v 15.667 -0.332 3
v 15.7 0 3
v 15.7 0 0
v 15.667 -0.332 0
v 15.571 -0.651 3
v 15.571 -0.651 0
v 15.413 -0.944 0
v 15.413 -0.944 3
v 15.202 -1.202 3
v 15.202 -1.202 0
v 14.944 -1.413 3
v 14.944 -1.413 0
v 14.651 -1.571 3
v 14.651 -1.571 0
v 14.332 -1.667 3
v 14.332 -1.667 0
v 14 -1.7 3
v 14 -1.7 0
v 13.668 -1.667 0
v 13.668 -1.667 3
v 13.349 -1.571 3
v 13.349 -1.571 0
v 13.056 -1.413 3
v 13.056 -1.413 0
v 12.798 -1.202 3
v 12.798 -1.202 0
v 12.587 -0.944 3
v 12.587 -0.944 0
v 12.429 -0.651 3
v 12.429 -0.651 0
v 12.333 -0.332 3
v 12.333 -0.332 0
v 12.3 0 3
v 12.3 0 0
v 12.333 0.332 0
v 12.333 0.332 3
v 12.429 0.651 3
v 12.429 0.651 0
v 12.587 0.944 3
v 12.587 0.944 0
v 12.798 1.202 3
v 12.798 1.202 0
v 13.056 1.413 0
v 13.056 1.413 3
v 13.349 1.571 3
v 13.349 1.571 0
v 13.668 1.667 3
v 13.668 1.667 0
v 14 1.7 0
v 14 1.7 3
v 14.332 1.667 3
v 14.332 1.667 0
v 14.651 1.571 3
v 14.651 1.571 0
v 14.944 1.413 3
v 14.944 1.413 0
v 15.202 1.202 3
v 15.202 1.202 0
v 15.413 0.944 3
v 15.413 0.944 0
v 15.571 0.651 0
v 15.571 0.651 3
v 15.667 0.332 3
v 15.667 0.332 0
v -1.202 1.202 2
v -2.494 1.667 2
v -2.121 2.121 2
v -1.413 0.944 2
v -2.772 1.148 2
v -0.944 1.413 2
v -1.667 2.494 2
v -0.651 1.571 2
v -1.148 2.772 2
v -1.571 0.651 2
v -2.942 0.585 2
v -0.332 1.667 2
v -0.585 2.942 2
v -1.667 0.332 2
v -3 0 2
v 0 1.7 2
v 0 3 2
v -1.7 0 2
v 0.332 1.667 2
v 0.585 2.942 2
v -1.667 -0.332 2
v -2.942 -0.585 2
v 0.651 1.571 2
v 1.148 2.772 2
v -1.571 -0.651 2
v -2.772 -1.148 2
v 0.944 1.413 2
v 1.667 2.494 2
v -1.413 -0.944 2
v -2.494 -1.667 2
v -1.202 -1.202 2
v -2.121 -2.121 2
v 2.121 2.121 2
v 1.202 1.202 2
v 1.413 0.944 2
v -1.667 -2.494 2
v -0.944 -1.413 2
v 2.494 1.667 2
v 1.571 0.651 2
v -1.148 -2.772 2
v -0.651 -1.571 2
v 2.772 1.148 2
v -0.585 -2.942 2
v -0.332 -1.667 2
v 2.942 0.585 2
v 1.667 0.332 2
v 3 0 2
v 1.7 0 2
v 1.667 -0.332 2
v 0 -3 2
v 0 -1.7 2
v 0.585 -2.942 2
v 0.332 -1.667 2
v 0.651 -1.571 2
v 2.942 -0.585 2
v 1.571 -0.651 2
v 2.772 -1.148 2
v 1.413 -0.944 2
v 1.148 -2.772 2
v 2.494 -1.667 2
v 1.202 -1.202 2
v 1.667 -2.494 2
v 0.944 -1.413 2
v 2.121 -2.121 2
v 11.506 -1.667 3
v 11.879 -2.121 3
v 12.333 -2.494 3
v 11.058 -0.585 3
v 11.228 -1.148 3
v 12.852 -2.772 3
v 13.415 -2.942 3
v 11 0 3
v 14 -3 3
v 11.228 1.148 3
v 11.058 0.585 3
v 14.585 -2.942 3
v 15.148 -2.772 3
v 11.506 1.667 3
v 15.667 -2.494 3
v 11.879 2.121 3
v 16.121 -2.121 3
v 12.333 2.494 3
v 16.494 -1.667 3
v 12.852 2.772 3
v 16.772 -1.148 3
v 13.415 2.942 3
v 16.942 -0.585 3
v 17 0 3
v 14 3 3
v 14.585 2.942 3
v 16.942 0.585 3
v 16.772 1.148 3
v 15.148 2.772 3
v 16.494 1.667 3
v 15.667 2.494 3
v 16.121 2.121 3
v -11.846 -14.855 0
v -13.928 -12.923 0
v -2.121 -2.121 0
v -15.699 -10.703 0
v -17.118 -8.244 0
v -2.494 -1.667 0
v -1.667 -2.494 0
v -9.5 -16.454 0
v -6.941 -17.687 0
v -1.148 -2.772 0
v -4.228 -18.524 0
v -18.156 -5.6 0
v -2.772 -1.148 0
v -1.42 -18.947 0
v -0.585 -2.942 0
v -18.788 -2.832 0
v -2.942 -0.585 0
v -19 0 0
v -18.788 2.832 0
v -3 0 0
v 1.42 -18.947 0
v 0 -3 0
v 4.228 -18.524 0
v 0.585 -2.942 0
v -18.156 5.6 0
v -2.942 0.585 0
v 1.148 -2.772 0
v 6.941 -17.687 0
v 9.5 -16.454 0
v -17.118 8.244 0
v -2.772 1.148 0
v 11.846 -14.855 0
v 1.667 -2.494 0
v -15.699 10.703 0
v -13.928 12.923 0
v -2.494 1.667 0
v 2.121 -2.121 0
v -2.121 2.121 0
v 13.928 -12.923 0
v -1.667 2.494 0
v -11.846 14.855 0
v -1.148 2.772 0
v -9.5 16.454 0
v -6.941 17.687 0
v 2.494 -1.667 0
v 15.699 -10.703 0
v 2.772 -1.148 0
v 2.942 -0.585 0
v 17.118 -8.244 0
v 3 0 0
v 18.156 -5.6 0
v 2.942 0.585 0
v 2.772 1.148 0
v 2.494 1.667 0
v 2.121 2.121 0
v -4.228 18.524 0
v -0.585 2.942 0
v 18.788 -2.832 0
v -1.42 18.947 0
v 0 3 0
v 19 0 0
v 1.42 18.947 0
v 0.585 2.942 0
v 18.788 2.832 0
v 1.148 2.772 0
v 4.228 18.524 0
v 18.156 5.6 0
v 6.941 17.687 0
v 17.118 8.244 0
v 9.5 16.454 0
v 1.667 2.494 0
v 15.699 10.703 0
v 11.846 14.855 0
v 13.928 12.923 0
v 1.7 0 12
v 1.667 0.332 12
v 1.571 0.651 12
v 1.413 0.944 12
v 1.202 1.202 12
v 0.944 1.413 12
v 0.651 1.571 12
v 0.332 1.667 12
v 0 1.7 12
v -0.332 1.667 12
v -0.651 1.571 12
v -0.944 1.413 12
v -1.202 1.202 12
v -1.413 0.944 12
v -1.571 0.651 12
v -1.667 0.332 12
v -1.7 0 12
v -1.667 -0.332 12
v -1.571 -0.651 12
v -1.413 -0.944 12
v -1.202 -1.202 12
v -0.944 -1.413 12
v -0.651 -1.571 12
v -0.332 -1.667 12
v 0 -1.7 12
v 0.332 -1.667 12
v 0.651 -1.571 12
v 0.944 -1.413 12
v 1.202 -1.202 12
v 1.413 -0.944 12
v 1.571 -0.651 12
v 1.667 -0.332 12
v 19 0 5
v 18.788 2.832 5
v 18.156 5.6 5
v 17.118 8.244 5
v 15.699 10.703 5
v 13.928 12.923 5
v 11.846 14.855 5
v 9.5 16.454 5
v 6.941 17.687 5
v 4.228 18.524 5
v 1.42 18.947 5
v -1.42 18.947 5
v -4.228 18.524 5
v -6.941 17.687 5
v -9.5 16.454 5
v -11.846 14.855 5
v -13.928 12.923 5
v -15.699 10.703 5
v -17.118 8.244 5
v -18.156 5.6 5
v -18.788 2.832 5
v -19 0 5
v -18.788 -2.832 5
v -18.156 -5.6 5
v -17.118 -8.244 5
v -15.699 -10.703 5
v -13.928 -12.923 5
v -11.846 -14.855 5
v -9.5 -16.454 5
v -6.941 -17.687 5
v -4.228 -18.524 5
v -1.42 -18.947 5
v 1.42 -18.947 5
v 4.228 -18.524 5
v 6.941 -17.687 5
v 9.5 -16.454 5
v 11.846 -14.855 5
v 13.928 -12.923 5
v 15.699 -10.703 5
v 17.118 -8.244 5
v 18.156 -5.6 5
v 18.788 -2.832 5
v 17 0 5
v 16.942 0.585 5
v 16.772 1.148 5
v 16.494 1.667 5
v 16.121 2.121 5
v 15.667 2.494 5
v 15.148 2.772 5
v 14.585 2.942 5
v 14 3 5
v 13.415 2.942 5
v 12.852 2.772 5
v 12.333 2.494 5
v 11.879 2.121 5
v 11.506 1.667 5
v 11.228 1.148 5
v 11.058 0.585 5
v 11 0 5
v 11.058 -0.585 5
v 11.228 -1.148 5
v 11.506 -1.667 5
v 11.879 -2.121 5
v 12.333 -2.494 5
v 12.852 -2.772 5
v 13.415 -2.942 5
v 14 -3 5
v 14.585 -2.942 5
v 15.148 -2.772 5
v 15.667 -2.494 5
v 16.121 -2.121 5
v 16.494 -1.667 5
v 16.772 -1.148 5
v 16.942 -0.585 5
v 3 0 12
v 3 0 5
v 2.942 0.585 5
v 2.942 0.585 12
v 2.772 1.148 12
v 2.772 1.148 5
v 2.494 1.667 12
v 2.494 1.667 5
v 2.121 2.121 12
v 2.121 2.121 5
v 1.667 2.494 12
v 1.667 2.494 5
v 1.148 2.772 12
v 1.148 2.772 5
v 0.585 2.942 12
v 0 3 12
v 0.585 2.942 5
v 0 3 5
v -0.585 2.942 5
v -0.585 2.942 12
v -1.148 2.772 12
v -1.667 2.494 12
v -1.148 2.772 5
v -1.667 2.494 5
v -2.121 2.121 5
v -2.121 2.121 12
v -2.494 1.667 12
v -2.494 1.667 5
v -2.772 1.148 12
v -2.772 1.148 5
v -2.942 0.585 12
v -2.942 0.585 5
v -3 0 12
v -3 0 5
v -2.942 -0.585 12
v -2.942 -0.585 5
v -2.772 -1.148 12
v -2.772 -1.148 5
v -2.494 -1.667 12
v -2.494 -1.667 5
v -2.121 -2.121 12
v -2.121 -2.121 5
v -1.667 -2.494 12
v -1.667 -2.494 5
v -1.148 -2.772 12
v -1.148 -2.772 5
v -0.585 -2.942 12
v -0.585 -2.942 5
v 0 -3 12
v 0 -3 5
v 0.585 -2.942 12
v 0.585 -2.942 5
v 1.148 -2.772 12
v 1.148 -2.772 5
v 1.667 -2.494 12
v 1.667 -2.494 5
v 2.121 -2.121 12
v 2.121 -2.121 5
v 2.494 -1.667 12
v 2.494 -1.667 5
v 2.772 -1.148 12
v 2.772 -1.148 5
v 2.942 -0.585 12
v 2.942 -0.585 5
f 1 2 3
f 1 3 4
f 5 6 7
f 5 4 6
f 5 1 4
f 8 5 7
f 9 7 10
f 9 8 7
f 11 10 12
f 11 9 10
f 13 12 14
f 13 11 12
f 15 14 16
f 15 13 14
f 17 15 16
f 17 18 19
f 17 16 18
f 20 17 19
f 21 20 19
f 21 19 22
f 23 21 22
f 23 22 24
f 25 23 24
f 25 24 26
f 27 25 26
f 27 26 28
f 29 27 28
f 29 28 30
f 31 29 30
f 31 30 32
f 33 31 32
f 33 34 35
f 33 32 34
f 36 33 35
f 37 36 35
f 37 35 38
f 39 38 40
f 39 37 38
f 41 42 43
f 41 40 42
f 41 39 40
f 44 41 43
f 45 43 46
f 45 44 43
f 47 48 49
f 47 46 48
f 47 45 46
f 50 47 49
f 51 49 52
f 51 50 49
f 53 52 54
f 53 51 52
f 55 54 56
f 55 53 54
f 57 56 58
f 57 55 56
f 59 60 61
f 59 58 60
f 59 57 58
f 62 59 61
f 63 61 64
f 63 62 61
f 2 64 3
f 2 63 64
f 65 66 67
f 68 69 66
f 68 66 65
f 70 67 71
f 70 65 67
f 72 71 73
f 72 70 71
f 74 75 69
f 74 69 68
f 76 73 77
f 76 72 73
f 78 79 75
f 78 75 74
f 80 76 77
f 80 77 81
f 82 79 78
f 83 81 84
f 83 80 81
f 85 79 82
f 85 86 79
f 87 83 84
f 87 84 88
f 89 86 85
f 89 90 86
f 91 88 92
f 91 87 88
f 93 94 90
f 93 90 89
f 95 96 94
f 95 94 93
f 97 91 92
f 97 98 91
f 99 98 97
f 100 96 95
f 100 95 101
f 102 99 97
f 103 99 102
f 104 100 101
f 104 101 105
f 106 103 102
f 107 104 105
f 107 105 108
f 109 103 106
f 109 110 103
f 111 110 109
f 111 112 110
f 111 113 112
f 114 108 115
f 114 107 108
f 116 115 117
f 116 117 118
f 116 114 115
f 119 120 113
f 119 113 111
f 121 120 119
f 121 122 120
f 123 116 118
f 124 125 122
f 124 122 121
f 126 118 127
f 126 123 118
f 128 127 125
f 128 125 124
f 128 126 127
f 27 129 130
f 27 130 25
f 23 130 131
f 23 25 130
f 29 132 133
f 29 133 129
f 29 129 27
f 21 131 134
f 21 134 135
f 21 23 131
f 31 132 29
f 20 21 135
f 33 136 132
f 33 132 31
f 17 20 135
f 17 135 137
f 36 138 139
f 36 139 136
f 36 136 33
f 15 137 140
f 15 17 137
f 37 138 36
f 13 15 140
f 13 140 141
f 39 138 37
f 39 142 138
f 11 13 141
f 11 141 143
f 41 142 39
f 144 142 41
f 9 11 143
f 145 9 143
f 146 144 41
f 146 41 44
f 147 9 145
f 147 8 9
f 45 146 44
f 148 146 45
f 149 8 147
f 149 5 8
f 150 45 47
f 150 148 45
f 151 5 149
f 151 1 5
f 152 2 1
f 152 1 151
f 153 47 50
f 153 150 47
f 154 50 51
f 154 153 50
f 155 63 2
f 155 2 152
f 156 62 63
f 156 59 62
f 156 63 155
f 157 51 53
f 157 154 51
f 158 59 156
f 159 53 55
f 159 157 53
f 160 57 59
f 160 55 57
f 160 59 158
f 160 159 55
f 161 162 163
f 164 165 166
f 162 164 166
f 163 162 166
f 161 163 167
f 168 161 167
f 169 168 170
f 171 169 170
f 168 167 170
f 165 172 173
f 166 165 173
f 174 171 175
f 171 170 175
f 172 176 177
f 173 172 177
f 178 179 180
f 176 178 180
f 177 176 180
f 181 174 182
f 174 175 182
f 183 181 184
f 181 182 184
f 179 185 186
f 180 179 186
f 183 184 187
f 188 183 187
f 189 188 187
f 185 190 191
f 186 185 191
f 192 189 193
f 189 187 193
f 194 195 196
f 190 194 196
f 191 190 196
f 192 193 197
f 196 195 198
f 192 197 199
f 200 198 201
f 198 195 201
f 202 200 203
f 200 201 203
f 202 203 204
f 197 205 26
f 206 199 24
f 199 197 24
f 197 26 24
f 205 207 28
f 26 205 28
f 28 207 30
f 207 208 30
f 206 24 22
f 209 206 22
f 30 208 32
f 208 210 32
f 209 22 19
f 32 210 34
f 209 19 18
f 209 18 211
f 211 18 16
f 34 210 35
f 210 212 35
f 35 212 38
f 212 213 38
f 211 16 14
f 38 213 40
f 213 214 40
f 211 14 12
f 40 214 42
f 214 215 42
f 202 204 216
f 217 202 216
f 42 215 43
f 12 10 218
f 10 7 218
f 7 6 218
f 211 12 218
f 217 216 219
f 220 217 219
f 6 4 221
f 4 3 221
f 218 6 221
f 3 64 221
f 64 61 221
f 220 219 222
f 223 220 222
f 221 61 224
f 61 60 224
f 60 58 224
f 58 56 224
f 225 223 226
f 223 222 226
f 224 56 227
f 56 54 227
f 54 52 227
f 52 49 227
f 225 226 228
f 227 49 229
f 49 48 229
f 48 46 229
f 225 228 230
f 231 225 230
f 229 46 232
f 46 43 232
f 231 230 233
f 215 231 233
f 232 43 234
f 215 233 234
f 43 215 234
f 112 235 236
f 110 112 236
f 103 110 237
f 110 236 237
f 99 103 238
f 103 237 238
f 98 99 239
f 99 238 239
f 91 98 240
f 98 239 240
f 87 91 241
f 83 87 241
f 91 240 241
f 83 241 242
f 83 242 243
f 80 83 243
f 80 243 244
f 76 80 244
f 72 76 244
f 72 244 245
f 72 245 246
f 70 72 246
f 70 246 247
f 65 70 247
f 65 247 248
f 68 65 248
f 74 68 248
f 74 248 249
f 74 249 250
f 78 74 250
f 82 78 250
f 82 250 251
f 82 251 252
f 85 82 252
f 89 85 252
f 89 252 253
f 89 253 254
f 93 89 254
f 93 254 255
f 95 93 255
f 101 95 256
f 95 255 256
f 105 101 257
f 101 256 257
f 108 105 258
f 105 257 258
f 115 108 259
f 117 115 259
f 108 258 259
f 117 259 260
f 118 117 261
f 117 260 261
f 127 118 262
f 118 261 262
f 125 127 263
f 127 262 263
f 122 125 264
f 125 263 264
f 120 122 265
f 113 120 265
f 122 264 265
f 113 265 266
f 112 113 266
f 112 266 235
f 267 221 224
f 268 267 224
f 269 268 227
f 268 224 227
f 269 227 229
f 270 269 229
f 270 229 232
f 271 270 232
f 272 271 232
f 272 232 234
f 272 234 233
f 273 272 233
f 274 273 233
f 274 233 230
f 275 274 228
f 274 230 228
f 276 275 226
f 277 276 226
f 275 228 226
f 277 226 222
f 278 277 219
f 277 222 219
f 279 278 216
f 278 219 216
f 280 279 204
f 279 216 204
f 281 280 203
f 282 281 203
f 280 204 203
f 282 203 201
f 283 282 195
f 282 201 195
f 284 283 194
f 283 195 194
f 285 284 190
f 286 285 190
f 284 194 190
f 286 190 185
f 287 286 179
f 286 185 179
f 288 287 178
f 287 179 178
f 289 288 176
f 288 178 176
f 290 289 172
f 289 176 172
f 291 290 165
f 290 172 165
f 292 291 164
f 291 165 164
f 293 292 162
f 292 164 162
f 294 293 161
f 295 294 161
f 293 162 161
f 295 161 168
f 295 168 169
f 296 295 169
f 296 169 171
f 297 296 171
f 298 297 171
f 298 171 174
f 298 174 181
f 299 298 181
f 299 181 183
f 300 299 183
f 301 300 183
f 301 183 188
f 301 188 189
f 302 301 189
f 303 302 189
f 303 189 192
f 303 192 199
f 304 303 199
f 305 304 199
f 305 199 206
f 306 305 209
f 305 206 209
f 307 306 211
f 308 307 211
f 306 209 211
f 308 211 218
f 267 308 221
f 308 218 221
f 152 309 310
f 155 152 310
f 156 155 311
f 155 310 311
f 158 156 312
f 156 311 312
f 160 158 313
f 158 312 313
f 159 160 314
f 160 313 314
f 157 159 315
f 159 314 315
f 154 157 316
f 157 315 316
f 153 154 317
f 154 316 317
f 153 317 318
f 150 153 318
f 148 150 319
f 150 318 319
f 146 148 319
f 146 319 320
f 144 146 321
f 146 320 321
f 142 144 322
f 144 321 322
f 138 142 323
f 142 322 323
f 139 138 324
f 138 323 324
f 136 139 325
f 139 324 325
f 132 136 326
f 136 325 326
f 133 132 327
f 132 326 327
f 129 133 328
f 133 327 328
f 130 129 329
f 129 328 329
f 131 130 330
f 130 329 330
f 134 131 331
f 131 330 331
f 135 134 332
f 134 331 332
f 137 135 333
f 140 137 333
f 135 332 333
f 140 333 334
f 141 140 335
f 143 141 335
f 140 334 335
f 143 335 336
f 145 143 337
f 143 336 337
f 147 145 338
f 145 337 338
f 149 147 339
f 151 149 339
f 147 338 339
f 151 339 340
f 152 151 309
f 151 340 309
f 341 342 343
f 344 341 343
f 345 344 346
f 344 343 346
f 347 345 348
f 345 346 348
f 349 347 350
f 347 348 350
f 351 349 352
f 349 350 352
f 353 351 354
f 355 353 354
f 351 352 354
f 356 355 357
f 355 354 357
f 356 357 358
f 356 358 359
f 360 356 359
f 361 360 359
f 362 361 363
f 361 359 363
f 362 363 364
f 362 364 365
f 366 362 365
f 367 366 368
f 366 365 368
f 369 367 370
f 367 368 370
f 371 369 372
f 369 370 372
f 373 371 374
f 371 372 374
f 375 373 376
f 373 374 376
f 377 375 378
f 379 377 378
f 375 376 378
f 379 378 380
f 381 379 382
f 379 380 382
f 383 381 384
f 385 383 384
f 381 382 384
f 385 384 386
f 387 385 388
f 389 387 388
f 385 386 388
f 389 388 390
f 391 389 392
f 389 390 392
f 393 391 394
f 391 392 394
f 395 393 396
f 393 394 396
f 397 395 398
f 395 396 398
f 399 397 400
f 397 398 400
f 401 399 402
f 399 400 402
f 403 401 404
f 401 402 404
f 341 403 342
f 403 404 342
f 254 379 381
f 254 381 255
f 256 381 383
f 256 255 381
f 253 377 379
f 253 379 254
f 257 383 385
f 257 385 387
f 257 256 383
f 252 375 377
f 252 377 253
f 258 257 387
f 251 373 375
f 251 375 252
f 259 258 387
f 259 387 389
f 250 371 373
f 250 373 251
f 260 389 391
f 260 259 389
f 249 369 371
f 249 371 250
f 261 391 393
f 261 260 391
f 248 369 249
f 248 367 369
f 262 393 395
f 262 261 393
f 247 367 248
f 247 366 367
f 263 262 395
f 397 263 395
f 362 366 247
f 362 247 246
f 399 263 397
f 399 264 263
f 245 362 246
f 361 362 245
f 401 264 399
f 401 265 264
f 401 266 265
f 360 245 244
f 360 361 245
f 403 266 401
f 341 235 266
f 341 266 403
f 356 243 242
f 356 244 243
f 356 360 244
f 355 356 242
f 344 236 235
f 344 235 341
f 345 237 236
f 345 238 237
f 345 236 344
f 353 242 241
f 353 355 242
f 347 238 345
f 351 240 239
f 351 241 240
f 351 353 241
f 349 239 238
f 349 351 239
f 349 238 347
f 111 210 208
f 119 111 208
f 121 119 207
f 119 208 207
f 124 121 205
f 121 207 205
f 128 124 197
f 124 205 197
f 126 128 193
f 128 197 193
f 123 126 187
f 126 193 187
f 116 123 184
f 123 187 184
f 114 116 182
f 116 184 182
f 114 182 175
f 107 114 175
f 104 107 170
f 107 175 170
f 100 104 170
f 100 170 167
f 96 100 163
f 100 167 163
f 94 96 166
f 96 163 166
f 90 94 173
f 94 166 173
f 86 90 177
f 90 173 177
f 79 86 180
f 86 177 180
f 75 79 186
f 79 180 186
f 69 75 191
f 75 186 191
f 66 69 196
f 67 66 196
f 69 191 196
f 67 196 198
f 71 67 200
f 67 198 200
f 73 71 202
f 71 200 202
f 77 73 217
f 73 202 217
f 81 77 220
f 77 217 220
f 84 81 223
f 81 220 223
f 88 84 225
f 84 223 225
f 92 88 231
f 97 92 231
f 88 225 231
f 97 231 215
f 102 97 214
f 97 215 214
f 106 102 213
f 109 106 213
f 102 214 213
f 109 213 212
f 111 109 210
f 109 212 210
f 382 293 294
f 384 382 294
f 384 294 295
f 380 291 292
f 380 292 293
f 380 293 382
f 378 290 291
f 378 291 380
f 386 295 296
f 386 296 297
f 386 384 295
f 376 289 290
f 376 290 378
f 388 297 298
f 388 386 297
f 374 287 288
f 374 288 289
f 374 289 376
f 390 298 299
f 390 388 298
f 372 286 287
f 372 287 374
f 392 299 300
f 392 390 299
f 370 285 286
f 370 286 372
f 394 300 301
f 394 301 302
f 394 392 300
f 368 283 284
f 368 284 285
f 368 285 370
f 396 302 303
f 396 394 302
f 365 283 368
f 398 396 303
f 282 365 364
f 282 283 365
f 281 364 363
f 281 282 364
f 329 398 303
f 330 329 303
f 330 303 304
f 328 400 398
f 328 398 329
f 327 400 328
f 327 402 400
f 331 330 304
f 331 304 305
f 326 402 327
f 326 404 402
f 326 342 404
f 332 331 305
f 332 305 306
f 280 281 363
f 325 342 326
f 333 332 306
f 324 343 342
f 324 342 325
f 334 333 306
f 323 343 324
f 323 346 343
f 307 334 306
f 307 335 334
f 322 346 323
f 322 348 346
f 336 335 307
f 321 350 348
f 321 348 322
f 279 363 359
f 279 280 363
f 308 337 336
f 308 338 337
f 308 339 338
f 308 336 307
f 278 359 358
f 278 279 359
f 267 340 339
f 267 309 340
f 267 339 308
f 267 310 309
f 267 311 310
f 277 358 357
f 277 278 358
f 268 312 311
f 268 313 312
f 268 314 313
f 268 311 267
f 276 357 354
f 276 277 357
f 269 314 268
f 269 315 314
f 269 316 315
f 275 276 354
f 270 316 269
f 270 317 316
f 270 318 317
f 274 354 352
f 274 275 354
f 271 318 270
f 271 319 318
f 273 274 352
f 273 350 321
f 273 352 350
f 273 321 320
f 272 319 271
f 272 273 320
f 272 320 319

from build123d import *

# Parameters (mm, degrees)
SKETCH1_R               = 19
BOSS_EXTRUDE1_DEPTH     = 5
SKETCH2_R               = 3
BOSS_EXTRUDE2_DEPTH     = 7
SKETCH3_R               = 1.7
CUT_EXTRUDE1_DEPTH      = 30.427877939
SKETCH4_R               = 3
CUT_EXTRUDE2_DEPTH      = 2
CUT_EXTRUDE3_DEPTH      = 30.427877939
CUT_EXTRUDE3_DEPTH_BACK = 30.427877939
SKETCH5_R               = 1.7
SKETCH6_R               = 3
CUT_EXTRUDE4_DEPTH      = 2


with BuildPart() as part:
    # Sketch1 → Boss-Extrude1 (new body)
    with BuildSketch(Plane(origin=(0, 0, 0), x_dir=(0, 1, 0), z_dir=(0, 0, 1))):
        with Locations(Location((0, 0, 0), (0, 0, 270))):
            Circle(SKETCH1_R)
    extrude(amount=BOSS_EXTRUDE1_DEPTH)

    # Sketch2 → Boss-Extrude2 (add)
    with BuildSketch(Plane.XY.offset(5)):
        Circle(SKETCH2_R)
    extrude(amount=BOSS_EXTRUDE2_DEPTH)

    # Sketch3 → Cut-Extrude1 (cut, through all)
    with BuildSketch(Plane.XY.offset(12)):
        Circle(SKETCH3_R)
    extrude(amount=-CUT_EXTRUDE1_DEPTH, mode=Mode.SUBTRACT)

    # Sketch4 → Cut-Extrude2 (cut)
    with BuildSketch(Plane(origin=(0, 0, 0), x_dir=(1, 0, 0), z_dir=(0, 0, -1))):
        Circle(SKETCH4_R)
    extrude(amount=-CUT_EXTRUDE2_DEPTH, mode=Mode.SUBTRACT)

    # Sketch5 → Cut-Extrude3 (cut, two sides: drawn at the far end of the back side and taken through both)
    with BuildSketch(Plane(origin=(0, 0, 0), x_dir=(1, 0, 0), z_dir=(0, 0, -1)).offset(-CUT_EXTRUDE3_DEPTH_BACK)):
        with Locations((14, 0)):
            Circle(SKETCH5_R)
    extrude(amount=CUT_EXTRUDE3_DEPTH + CUT_EXTRUDE3_DEPTH_BACK, mode=Mode.SUBTRACT)

    # Sketch6 → Cut-Extrude4 (cut)
    with BuildSketch(Plane.XY.offset(5)):
        with Locations((14, 0)):
            Circle(SKETCH6_R)
    extrude(amount=-CUT_EXTRUDE4_DEPTH, mode=Mode.SUBTRACT)


solid = part.part
